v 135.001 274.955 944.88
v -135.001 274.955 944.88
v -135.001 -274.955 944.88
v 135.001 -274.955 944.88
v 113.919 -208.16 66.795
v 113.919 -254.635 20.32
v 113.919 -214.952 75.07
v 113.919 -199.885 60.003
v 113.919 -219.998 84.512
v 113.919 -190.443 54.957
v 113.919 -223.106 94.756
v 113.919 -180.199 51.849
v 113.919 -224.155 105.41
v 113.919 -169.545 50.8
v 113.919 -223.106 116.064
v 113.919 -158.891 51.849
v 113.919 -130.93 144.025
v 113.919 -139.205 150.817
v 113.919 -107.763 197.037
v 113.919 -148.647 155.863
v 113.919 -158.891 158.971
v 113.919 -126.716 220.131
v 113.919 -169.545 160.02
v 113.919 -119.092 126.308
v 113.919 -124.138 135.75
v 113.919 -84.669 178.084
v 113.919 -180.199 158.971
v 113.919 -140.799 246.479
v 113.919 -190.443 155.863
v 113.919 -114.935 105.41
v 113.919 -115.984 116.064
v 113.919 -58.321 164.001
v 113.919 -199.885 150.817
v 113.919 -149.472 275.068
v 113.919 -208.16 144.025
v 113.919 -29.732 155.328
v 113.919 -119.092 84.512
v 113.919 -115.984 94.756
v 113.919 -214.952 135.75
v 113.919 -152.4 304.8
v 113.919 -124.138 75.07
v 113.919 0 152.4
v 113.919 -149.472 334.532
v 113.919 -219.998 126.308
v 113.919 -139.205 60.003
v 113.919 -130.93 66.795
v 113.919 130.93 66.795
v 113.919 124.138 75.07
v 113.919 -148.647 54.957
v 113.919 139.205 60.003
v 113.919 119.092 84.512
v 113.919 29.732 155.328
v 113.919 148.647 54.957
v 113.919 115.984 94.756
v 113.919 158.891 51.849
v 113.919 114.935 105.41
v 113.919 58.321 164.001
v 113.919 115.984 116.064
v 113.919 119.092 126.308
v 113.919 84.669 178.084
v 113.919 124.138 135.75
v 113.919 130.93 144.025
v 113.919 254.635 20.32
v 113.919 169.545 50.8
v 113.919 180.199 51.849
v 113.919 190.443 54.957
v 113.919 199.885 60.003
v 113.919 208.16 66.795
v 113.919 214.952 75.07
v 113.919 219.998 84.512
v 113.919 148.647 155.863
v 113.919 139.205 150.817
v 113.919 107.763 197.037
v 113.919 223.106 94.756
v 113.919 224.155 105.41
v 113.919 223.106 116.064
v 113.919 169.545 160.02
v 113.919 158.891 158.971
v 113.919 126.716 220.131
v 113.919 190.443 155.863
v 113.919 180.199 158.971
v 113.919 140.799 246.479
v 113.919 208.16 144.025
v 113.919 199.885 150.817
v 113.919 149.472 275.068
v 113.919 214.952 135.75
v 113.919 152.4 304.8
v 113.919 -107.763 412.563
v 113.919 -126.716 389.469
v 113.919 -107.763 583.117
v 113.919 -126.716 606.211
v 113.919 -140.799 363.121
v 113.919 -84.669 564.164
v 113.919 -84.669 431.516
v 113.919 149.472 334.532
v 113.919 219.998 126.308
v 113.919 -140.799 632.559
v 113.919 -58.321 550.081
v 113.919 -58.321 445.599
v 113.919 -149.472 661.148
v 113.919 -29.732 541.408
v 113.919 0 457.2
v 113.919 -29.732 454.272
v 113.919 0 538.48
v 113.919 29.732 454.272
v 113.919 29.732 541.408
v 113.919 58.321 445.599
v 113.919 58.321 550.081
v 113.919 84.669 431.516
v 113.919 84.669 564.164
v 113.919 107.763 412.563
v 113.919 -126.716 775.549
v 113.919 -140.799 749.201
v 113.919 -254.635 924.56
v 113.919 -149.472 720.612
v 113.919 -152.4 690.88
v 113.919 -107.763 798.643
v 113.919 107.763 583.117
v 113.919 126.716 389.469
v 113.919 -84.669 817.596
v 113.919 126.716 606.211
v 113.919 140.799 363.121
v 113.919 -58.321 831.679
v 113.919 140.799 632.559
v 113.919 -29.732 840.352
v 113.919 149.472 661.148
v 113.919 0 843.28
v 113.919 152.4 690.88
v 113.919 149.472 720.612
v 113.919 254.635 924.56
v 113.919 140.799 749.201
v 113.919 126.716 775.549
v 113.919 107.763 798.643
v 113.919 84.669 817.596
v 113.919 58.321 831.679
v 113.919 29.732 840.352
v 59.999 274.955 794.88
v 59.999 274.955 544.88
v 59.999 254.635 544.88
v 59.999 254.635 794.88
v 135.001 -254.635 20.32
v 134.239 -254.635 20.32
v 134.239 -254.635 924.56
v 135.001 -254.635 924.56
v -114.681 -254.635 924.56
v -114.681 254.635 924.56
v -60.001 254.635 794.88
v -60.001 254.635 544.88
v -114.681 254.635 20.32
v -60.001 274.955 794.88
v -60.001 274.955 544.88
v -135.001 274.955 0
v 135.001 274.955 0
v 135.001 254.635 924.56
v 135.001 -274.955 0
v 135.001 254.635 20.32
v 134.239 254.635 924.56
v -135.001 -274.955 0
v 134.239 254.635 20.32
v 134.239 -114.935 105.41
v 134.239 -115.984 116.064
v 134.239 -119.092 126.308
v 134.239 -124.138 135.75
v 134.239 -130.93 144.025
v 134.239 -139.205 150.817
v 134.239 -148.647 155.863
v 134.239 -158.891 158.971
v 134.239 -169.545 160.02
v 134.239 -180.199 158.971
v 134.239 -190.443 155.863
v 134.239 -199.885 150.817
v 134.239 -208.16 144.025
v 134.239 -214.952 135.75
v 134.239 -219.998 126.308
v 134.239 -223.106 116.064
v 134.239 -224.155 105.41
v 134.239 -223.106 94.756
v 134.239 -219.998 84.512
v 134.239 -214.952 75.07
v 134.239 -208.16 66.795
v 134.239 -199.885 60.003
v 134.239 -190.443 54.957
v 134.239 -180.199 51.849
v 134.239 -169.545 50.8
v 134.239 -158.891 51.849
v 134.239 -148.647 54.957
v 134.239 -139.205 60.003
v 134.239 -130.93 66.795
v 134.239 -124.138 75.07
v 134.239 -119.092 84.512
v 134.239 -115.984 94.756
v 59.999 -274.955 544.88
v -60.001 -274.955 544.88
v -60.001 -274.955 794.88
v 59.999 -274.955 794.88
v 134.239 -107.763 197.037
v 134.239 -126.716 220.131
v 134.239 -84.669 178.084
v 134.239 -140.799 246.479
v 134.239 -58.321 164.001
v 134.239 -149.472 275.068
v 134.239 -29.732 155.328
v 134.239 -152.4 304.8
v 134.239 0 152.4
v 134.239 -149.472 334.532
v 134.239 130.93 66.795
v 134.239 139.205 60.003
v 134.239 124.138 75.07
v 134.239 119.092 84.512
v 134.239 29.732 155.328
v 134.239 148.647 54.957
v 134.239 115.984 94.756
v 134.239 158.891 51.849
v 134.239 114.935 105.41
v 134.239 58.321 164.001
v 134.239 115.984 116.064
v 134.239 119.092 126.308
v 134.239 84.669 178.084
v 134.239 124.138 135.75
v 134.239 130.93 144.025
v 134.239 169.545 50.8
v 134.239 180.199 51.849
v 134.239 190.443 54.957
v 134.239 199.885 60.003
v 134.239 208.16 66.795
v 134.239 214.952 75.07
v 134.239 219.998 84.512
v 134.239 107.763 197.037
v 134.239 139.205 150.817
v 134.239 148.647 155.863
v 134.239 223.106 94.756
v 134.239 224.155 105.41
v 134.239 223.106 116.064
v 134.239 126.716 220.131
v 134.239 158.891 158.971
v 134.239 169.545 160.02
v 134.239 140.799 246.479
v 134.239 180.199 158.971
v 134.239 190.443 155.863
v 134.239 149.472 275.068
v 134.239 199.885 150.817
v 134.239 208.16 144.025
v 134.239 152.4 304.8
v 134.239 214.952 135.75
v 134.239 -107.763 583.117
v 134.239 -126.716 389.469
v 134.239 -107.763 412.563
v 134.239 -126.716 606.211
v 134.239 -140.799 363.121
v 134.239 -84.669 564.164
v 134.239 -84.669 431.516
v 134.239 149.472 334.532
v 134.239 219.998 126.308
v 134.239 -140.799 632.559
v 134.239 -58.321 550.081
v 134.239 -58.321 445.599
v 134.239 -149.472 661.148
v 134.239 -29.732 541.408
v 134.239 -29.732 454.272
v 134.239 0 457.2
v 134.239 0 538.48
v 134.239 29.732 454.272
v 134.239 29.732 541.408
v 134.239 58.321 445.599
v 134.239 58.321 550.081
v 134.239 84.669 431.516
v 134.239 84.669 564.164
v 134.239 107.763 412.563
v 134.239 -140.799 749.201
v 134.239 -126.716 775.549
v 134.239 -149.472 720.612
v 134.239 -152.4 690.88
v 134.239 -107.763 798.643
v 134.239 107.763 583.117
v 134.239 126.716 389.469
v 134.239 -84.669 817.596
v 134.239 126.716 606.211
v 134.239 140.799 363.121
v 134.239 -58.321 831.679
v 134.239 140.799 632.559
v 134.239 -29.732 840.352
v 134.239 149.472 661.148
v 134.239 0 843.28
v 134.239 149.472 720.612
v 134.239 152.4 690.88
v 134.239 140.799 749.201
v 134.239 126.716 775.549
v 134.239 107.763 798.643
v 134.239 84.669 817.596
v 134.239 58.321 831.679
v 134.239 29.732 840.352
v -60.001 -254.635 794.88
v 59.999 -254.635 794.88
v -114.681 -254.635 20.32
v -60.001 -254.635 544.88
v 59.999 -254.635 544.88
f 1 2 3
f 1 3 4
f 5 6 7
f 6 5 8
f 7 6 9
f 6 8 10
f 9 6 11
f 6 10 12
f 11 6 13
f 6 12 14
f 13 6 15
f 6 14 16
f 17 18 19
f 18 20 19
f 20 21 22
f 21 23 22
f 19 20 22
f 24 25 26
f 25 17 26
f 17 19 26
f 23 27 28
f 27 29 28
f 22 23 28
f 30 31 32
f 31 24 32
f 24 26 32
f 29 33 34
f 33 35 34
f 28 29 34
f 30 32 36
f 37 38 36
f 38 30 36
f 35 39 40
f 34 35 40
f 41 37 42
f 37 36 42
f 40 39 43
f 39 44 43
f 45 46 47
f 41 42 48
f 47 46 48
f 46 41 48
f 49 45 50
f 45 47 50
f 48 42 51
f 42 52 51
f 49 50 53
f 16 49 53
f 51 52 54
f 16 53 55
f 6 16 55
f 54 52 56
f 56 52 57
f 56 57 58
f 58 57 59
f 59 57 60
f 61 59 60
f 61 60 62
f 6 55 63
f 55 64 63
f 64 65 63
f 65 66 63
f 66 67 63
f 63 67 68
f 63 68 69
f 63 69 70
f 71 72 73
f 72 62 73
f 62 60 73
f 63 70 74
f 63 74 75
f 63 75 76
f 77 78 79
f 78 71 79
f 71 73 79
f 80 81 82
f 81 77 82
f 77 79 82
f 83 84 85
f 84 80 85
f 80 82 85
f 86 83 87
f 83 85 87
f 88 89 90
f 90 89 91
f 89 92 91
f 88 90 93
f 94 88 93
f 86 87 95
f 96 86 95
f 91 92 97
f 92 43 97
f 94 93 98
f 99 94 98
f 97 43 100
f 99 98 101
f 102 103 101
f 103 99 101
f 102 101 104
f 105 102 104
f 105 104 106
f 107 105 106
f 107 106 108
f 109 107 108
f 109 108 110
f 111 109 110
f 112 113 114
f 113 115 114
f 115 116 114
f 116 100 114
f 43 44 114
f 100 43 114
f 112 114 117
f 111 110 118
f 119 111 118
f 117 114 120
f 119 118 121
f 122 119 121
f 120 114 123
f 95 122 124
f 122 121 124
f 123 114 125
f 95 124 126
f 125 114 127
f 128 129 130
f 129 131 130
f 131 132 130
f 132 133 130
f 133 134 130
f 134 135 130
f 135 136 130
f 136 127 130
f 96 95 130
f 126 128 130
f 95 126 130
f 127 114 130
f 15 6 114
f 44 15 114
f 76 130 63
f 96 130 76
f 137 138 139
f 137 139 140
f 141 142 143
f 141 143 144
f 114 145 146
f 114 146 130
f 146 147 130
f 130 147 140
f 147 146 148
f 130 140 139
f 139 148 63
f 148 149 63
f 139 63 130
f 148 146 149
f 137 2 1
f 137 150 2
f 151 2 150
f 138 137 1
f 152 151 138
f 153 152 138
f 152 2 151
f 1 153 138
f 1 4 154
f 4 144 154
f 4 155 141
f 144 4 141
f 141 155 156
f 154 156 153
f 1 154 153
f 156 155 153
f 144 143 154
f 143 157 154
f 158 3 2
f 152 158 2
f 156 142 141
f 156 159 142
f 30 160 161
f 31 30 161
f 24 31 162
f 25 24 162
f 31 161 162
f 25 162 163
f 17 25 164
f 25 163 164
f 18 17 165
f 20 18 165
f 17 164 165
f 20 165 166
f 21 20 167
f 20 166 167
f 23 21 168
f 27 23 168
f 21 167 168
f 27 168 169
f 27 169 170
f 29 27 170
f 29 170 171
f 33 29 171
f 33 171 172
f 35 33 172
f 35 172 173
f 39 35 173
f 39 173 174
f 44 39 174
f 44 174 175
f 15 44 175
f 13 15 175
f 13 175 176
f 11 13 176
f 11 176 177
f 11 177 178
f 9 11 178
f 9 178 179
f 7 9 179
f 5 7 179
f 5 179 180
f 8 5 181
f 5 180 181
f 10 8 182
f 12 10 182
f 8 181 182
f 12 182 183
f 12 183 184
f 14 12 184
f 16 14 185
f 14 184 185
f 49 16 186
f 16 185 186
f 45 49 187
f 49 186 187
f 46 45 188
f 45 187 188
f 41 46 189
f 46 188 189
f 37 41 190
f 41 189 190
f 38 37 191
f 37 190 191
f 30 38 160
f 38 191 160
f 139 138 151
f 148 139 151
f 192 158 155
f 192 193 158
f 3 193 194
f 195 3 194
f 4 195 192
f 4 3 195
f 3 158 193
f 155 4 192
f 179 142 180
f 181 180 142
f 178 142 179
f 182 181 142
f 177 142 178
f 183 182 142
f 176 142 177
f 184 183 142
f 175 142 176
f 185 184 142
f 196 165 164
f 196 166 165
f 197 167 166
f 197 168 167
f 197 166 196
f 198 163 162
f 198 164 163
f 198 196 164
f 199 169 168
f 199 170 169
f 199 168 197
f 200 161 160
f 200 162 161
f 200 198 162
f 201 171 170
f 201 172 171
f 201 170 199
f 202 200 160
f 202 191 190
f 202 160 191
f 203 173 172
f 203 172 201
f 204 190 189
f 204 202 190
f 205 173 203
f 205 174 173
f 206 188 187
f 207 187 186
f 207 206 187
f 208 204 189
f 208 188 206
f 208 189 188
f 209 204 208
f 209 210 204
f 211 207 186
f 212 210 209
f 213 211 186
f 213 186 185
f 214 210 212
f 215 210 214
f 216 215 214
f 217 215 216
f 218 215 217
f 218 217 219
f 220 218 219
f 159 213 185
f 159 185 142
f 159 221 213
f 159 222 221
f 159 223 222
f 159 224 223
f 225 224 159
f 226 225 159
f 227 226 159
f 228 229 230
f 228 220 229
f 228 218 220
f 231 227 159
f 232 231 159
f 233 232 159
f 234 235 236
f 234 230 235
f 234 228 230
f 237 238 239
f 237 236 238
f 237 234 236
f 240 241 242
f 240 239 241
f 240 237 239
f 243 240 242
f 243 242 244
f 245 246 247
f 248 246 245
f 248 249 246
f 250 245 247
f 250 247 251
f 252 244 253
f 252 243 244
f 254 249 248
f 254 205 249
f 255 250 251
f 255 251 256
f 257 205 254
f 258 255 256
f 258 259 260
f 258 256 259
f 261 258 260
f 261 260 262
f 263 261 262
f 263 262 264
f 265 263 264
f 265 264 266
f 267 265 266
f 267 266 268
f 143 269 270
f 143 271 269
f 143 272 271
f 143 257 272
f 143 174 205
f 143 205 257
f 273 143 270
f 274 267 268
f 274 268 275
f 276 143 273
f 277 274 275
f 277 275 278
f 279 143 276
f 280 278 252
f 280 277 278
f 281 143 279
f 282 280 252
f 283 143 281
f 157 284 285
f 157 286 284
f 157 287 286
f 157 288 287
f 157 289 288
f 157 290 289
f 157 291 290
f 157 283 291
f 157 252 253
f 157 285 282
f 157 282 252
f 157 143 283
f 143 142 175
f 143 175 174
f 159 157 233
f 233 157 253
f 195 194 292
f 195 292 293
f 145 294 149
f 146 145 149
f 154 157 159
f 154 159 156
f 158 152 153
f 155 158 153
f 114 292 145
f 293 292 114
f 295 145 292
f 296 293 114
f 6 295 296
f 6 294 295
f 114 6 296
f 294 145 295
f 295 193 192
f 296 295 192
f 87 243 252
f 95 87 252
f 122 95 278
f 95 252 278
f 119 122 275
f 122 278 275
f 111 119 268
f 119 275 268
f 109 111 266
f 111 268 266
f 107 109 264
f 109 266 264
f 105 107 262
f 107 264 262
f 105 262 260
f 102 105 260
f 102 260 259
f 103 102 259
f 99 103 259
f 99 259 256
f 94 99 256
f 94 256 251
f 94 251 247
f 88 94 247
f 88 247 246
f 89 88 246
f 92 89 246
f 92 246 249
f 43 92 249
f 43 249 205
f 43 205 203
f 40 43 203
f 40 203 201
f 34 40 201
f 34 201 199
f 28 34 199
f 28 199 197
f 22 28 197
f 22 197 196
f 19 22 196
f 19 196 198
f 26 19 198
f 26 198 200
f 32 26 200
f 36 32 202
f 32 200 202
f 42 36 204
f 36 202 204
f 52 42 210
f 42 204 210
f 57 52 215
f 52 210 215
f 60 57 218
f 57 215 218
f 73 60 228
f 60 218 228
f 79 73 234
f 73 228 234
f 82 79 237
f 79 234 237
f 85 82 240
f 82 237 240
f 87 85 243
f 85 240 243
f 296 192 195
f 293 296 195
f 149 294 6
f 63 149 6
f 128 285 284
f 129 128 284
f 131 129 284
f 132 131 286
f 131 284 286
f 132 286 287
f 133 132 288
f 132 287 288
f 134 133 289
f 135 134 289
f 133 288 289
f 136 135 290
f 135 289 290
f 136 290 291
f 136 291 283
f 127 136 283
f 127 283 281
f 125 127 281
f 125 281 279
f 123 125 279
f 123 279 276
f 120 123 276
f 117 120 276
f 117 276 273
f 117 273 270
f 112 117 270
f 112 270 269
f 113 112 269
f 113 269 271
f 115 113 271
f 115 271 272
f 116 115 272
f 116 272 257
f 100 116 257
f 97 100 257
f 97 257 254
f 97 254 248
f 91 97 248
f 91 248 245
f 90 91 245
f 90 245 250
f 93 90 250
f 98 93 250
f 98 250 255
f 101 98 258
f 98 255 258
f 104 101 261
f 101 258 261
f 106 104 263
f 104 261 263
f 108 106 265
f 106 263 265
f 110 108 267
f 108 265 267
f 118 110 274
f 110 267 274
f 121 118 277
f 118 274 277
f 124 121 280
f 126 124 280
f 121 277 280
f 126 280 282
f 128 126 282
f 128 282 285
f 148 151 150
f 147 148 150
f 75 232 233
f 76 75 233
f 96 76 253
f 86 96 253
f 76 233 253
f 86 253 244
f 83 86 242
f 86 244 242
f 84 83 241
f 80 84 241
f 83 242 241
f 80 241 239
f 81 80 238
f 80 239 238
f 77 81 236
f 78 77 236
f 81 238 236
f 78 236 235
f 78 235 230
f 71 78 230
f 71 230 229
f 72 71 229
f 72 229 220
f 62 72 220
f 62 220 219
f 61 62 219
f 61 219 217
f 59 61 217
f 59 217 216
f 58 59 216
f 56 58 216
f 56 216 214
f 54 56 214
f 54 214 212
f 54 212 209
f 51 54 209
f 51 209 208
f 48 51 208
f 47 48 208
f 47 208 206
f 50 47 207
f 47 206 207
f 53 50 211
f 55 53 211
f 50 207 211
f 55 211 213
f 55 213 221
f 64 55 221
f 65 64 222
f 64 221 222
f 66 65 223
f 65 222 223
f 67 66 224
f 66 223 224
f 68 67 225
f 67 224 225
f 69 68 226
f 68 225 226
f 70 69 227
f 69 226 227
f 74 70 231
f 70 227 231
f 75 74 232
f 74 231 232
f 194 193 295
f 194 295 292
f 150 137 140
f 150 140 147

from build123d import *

# Parameters (mm, degrees)
F0_W      = 270.002
F0_H      = 549.91
F1_DEPTH  = 25.4
F2_W      = 270.002
F2_H      = 549.91
F3_DEPTH  = 919.48
F4_T      = -20.32
F5_START  = 228.6
F4_FACE_W = 509.27
F4_FACE_H = 904.24
F5_DEPTH  = 20.32
F7_DEPTH  = 25.4
F8_R      = 152.4
F9_DEPTH  = 25.4
F10_R     = 54.61
F11_DEPTH = 25.4
F12_R     = 54.61
F13_DEPTH = 25.4
F14_W     = 120
F14_H     = 250
F15_DEPTH = 22
F16_DEPTH = 55.88
F17_W     = 120
F17_H     = 250
F18_DEPTH = 50.8


with BuildPart() as f1:
    # F0 (on Top) → F1 (new body)
    with BuildSketch(Plane.XY):
        Rectangle(F0_W, F0_H)
    extrude(amount=F1_DEPTH)

    # F2 (on face) → F3 (join)
    with BuildSketch(Plane.XY.offset(25.4)):
        Rectangle(F2_W, F2_H)
    extrude(amount=F3_DEPTH)

    # F4
    f4_openings = [f1.faces().sort_by_distance(p)[0] for p in [
        (135.001, 0, 472.44),
    ]]
    offset(amount=F4_T, openings=f4_openings)

    # F4_face (on face) → F5 (join)
    with BuildSketch(Plane(origin=(-114.681, 0, 472.44), x_dir=(0, 1, 0), z_dir=(1, 0, 0)).offset(F5_START)):
        Rectangle(F4_FACE_W, F4_FACE_H)
    extrude(amount=F5_DEPTH)

    # F6 (on face) → F7 (cut)
    with BuildSketch(Plane.YZ.offset(134.239)):
        with BuildLine():
            ThreePointArc((0, 843.28), (-107.7630734528, 583.1169265472), (152.4, 690.88))
            ThreePointArc((152.4, 690.88), (107.7630734528, 798.6430734528), (0, 843.28))
        make_face()
    extrude(amount=-F7_DEPTH, mode=Mode.SUBTRACT)

    # F8 (on face) → F9 (cut)
    with BuildSketch(Plane.YZ.offset(134.239)):
        with Locations((0, 304.8)):
            Circle(F8_R)
    extrude(amount=-F9_DEPTH, mode=Mode.SUBTRACT)

    # F10 (on face) → F11 (cut)
    with BuildSketch(Plane.YZ.offset(134.239)):
        with Locations((-169.545, 105.41)):
            Circle(F10_R)
    extrude(amount=-F11_DEPTH, mode=Mode.SUBTRACT)

    # F12 (on face) → F13 (cut)
    with BuildSketch(Plane.YZ.offset(134.239)):
        with Locations((169.545, 105.41)):
            Circle(F12_R)
    extrude(amount=-F13_DEPTH, mode=Mode.SUBTRACT)

    # F14 (on face) → F15 (join)
    with BuildSketch(Plane.XZ.offset(274.955)):
        with Locations((-0.001, 669.88)):
            Rectangle(F14_W, F14_H)
    extrude(amount=-F15_DEPTH)

    # F14 (on face) → F16 (cut)
    with BuildSketch(Plane.XZ.offset(274.955)):
        with Locations((-0.001, 669.88)):
            Rectangle(F14_W, F14_H)
    extrude(amount=-F16_DEPTH, mode=Mode.SUBTRACT)

    # F17 (on face) → F18 (cut)
    with BuildSketch(Plane(origin=(0, 274.955, 0), x_dir=(-1, 0, 0), z_dir=(0, 1, 0))):
        with Locations((0.001, 669.88)):
            Rectangle(F17_W, F17_H)
    extrude(amount=-F18_DEPTH, mode=Mode.SUBTRACT)


solid = f1.part
